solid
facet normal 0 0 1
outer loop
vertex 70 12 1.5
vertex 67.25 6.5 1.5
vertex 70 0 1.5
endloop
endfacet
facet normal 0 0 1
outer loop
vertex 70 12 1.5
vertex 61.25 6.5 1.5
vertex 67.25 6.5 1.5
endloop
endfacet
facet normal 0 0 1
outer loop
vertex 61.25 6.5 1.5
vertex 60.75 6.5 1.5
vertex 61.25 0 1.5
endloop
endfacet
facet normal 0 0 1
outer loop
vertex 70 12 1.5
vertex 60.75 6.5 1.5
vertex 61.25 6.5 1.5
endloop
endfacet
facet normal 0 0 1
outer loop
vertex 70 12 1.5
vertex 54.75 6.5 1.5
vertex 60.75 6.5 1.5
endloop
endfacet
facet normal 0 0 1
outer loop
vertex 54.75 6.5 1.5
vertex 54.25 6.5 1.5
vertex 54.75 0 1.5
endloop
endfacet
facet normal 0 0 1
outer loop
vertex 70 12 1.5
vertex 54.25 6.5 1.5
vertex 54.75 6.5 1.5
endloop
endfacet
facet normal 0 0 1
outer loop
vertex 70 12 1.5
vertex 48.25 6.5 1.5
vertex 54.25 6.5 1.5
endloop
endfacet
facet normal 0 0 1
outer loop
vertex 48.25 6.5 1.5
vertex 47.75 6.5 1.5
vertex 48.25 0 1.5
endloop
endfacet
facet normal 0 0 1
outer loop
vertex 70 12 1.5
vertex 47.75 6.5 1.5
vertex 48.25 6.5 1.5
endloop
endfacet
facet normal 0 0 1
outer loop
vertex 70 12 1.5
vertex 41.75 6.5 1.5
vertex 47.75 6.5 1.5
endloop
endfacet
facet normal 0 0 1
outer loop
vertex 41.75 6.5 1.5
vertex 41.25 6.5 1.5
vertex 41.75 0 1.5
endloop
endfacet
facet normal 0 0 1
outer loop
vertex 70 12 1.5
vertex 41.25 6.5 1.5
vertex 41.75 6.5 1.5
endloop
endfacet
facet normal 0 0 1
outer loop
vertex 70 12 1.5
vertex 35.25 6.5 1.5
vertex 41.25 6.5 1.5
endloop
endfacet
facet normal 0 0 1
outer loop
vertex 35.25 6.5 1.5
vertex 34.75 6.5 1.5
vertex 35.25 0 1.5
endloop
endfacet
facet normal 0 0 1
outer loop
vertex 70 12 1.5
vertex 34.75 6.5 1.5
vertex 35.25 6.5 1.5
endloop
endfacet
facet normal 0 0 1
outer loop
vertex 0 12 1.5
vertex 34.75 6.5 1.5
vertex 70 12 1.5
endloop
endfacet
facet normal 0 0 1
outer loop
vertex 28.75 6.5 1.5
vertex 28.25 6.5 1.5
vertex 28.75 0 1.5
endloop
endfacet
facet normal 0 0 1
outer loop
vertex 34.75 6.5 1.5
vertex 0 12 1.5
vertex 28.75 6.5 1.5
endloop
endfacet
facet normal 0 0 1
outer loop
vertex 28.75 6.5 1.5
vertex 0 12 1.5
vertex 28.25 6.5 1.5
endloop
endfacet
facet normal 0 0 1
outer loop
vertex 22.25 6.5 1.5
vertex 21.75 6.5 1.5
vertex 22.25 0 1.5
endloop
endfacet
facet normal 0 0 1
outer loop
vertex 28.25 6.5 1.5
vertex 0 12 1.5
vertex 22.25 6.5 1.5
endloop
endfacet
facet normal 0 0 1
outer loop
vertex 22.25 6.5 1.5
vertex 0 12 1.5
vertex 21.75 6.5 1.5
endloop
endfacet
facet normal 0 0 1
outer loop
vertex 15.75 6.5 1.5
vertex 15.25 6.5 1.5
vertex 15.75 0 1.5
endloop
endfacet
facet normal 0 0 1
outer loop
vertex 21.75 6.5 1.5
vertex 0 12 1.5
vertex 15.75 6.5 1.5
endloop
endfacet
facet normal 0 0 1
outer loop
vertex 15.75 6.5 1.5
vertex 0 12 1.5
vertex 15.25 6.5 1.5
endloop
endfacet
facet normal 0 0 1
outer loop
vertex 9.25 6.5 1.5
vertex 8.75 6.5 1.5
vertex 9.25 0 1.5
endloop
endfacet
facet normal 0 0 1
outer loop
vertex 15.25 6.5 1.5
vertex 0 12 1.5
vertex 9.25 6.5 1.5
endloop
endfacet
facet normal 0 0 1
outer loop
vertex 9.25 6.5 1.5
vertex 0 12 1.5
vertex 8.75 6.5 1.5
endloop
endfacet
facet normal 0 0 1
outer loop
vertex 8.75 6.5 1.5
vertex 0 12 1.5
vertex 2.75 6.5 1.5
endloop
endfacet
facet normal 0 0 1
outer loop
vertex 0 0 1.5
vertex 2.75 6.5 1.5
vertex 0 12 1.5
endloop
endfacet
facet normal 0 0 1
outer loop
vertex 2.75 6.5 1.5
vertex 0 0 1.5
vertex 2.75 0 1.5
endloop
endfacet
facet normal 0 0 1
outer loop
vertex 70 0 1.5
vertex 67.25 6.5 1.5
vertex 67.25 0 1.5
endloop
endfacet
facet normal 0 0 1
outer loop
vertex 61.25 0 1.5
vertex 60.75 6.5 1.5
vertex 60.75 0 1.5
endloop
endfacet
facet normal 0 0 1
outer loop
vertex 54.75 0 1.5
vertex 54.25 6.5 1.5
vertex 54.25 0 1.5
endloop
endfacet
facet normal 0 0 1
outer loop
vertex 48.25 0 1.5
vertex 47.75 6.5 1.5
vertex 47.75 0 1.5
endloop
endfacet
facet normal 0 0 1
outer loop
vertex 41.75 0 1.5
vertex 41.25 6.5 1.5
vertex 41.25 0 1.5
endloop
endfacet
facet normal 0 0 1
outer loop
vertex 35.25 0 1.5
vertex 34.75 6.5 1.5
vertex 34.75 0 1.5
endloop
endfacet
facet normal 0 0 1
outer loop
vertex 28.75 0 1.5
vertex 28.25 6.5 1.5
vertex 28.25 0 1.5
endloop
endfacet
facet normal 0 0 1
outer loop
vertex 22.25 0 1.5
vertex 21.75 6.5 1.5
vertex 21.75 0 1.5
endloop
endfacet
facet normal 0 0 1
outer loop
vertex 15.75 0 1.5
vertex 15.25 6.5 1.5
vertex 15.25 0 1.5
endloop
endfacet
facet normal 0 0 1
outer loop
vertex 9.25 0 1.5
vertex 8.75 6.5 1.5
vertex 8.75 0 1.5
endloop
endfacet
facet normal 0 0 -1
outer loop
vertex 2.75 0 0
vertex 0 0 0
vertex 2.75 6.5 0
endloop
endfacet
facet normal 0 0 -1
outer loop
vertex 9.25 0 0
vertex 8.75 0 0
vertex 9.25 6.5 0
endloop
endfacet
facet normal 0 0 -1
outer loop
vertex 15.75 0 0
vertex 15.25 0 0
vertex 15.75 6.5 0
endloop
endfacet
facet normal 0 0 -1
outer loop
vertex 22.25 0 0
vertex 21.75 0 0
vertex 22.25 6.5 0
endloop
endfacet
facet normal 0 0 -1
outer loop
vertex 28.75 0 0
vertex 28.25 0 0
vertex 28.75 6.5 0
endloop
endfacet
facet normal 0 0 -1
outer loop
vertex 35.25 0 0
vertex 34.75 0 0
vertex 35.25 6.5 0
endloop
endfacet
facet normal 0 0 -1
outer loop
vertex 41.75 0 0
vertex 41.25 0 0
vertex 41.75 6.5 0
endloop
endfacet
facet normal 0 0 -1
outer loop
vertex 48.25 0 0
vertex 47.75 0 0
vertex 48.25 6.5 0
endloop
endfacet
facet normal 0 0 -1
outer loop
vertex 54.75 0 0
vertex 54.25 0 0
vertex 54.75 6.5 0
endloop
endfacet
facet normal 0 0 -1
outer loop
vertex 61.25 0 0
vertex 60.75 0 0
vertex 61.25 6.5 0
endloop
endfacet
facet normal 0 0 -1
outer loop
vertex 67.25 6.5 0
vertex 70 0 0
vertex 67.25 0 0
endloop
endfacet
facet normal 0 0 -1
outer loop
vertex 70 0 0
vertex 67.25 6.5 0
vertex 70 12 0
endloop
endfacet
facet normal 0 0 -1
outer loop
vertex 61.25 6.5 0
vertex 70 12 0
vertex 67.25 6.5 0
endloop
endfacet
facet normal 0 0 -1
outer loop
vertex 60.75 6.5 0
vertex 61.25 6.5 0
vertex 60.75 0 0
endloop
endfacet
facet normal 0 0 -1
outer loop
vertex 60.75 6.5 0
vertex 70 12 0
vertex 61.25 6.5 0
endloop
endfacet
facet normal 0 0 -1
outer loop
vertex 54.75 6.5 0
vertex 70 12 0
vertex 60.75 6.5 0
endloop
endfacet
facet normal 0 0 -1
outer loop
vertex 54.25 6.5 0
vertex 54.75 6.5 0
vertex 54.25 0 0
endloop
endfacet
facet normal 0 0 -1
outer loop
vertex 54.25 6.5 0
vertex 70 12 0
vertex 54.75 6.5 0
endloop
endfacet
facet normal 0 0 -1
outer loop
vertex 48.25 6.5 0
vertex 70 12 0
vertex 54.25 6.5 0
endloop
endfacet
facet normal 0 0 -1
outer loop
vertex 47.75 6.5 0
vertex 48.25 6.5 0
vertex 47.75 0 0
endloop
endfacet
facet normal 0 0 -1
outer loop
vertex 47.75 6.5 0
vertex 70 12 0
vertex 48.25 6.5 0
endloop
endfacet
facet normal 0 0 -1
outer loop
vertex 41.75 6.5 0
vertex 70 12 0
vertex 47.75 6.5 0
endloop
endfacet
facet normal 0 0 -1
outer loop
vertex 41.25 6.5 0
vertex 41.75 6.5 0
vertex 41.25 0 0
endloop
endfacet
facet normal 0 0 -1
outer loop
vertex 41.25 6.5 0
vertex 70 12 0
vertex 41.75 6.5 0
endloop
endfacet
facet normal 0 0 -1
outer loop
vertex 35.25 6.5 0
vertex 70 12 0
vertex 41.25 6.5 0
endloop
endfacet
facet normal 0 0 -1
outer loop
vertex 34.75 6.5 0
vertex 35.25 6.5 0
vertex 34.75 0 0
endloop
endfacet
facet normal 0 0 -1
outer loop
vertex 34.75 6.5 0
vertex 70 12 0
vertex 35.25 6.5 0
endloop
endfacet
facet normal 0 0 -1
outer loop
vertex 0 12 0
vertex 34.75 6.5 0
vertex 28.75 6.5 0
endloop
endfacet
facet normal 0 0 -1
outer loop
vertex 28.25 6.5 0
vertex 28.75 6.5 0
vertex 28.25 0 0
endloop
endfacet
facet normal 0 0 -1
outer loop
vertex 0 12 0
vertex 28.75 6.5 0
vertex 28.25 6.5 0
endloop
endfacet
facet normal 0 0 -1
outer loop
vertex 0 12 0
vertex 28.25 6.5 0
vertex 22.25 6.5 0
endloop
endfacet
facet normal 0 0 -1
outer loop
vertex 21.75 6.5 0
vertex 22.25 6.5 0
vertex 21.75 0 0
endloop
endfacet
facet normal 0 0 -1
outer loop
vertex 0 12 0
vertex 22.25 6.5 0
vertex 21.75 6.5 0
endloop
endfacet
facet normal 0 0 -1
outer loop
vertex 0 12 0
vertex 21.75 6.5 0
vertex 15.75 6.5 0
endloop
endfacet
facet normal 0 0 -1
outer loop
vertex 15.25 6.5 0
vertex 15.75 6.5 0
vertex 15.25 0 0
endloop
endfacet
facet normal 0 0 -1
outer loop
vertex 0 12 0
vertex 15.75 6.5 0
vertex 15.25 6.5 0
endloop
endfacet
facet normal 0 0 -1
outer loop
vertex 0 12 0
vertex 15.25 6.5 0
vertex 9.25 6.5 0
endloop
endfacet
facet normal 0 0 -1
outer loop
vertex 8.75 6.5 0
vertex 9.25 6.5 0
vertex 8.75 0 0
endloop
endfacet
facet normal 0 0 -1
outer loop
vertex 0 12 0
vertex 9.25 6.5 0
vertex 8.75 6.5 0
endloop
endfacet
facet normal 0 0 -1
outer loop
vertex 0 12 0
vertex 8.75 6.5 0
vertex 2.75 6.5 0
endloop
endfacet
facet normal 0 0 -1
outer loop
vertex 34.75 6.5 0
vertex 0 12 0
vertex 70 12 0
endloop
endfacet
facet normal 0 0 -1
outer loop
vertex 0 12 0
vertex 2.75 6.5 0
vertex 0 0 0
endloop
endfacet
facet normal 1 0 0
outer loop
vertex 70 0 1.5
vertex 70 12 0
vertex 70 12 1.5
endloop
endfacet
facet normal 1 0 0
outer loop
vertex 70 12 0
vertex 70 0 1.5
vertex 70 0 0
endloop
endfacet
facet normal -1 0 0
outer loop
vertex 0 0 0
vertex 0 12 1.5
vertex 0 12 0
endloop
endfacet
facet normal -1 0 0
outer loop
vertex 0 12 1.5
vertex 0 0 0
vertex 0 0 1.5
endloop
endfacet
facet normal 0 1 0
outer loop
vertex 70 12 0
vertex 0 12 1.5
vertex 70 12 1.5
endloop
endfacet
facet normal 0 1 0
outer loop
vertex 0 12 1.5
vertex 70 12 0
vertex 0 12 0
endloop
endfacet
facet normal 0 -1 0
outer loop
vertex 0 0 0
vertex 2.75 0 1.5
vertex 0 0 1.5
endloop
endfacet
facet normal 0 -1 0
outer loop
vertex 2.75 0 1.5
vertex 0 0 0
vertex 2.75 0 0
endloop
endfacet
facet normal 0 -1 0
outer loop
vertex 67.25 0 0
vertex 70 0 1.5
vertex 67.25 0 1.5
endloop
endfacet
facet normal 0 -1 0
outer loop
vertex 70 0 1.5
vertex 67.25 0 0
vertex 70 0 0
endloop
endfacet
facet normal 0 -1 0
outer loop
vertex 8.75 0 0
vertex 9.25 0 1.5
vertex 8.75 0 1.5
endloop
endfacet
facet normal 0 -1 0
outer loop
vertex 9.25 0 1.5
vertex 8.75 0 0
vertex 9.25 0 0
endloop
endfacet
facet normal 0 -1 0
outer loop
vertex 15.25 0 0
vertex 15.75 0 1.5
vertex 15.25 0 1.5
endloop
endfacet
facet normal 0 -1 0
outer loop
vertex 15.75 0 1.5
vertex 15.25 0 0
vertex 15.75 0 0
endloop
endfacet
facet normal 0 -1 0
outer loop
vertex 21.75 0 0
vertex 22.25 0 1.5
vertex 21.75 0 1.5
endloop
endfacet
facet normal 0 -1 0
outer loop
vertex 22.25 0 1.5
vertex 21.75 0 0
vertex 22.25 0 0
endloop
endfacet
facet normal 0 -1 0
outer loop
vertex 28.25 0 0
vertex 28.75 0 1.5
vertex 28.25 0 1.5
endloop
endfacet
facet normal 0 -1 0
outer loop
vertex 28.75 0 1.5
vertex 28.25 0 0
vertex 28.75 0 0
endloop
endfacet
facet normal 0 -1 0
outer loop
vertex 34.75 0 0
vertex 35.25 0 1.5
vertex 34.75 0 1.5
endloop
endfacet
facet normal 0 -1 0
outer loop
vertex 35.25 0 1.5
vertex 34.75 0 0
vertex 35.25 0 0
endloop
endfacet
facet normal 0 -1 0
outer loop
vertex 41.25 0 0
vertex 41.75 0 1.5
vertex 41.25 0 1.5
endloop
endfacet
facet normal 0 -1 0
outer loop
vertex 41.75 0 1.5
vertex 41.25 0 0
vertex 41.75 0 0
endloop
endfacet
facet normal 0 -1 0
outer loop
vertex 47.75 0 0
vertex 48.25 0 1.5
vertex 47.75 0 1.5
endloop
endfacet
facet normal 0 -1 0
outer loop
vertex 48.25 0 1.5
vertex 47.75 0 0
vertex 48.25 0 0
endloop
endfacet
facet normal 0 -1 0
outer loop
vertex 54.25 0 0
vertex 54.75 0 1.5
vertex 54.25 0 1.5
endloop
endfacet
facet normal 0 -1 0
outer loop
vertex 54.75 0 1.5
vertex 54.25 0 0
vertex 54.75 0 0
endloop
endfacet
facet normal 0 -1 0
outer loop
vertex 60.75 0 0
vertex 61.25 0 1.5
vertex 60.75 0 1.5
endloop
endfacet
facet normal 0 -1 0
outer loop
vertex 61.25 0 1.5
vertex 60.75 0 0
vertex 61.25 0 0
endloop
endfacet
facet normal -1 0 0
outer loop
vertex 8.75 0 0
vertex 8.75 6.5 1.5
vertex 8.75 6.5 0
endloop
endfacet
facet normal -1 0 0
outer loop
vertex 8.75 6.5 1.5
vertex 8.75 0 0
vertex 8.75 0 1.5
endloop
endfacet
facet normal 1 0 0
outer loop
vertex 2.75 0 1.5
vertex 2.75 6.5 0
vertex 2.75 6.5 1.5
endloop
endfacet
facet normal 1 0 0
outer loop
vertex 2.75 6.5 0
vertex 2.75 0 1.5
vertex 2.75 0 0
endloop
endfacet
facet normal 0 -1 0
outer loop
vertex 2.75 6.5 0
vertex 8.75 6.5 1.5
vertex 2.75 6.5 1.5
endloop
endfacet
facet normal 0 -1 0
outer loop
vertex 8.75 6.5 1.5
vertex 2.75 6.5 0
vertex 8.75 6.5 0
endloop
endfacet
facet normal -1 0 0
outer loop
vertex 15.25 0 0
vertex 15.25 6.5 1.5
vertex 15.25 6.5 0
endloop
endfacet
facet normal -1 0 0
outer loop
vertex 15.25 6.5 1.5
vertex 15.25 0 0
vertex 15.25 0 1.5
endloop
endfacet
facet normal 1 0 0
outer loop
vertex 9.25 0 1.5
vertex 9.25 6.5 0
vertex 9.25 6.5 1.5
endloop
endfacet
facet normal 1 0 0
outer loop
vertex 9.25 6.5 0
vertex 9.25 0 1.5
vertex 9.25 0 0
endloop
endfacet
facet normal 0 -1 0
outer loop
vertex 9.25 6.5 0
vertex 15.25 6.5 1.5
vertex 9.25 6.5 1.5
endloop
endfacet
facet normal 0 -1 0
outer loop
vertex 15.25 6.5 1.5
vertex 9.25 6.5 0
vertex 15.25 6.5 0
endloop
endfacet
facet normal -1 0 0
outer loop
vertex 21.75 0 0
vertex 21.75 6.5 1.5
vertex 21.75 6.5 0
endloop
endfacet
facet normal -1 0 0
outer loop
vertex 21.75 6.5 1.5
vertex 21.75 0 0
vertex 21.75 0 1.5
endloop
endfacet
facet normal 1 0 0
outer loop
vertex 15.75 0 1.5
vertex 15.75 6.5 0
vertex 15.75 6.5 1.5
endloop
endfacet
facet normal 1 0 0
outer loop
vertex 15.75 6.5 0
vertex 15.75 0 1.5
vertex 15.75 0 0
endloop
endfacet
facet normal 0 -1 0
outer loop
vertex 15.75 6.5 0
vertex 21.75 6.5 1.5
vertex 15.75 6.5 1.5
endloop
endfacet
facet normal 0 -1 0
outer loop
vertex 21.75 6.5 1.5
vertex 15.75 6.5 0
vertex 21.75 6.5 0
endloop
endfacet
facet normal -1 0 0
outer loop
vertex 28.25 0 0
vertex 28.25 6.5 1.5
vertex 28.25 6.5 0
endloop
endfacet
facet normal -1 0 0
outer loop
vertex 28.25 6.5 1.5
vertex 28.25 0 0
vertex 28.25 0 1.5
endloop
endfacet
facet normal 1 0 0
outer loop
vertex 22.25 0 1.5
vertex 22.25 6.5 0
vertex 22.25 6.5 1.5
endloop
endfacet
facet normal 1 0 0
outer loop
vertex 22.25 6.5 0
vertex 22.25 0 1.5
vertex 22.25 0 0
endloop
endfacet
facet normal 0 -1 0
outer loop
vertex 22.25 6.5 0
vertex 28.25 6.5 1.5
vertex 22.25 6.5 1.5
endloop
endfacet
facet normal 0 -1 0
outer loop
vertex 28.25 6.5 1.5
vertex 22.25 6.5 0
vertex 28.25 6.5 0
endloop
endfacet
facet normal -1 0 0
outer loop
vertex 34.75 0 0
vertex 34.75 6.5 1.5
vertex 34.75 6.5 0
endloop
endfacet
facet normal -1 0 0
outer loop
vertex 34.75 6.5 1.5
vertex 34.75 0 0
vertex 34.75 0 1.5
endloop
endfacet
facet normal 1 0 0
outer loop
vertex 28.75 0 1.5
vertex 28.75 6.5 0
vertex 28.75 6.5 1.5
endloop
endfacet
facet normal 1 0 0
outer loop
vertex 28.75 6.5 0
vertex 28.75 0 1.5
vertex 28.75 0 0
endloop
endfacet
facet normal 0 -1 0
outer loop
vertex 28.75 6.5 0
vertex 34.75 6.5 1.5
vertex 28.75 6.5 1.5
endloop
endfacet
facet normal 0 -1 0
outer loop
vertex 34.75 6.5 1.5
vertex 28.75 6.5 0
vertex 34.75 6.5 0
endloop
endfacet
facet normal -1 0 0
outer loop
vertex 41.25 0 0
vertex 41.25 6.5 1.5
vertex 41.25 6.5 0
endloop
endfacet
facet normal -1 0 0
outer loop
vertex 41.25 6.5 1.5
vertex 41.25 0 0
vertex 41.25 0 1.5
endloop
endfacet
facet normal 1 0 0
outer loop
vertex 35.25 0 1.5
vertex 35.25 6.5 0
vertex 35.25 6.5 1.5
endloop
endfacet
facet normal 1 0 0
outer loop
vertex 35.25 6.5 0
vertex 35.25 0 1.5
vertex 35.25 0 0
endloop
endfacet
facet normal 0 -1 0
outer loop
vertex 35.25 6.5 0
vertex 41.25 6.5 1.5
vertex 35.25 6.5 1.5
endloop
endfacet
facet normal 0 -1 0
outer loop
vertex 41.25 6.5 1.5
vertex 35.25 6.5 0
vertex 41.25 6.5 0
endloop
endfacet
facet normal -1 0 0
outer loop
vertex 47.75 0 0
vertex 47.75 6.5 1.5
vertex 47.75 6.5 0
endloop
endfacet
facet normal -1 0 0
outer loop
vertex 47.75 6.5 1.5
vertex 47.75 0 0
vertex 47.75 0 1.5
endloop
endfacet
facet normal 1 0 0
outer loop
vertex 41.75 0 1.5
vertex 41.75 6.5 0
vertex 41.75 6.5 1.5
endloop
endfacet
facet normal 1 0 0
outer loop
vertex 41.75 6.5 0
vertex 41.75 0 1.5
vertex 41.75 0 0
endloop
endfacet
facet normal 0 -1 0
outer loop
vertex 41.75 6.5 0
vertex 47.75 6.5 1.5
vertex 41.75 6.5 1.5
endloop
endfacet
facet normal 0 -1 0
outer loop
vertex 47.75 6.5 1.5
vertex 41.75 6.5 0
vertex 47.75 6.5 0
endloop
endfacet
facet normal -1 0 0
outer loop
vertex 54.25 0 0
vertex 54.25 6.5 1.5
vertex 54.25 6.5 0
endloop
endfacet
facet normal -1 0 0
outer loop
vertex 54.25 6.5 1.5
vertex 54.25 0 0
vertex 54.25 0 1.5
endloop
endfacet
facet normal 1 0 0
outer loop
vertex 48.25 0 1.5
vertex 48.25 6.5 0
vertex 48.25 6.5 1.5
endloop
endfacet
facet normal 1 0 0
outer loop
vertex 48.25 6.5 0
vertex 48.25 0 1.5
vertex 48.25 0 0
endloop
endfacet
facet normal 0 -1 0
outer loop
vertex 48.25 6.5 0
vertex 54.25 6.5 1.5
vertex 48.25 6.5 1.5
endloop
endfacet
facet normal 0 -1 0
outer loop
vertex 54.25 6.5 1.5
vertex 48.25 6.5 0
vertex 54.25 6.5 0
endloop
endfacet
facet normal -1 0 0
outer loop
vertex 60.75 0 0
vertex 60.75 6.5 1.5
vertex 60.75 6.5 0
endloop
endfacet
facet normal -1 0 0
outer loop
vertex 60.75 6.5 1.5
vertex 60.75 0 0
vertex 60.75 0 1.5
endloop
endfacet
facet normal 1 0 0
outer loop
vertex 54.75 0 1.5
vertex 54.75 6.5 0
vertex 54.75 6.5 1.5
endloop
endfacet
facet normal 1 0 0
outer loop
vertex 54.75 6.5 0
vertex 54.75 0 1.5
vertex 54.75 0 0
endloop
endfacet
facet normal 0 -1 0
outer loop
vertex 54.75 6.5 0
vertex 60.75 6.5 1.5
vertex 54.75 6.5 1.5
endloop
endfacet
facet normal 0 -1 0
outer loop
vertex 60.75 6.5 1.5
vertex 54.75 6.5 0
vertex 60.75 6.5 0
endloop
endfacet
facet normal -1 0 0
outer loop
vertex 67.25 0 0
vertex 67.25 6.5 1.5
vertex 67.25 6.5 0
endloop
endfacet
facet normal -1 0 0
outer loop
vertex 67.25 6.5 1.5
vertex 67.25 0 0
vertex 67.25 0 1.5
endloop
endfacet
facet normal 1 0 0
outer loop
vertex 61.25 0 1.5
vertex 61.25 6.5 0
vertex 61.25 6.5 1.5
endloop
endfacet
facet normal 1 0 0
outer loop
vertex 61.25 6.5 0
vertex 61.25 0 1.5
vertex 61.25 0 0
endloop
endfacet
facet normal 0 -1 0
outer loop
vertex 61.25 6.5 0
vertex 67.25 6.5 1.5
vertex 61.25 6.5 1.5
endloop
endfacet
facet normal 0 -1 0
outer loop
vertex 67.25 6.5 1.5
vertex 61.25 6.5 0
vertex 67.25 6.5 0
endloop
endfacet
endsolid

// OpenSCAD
// 10-well comb for casting agarose gels
// Print orientation: flat on bed, teeth pointing down (-Z)

// ---------- Parameters ----------
spine_len   = 70;    // spine length along X (mm)
spine_w     = 12;    // spine width along Y (mm)
comb_t      = 1.5;   // comb plate thickness along Z (mm)

tooth_w     = 5.0;   // tooth width along X (mm)
tooth_n     = 10;    // number of teeth
tooth_len   = 12;    // tooth length along Y (mm)
tooth_pitch = 1.5;   // gap between neighbouring teeth (mm)

eps         = 0.5;   // cutter overshoot past faces (mm)

$fn = 64;

// ---------- Derived ----------
total_tooth_w = tooth_w * tooth_n + (tooth_n - 1) * tooth_pitch;
x0            = (spine_len - total_tooth_w) / 2;   // first tooth X centre

// ---------- Model ----------
difference() {
    // Base plate (spine + teeth)
    translate([0, 0, 0])
        union() {
            // Spine
            translate([0, 0, 0])
                cube([spine_len, spine_w, comb_t]);

            // Teeth
            for (i = [0 : tooth_n - 1])
                translate([x0 + i * (tooth_w + tooth_pitch),
                           -spine_w / 2,
                           0])
                    cube([tooth_w, tooth_len, comb_t]);
        }

    // Cut out the well spaces (through the full thickness)
    for (i = [0 : tooth_n - 1])
        translate([x0 + i * (tooth_w + tooth_pitch) - eps,
                   -spine_w / 2 - eps,
                   -eps])
            cube([tooth_w + 2 * eps,
                  tooth_len + 2 * eps,
                  comb_t + 2 * eps]);
}
